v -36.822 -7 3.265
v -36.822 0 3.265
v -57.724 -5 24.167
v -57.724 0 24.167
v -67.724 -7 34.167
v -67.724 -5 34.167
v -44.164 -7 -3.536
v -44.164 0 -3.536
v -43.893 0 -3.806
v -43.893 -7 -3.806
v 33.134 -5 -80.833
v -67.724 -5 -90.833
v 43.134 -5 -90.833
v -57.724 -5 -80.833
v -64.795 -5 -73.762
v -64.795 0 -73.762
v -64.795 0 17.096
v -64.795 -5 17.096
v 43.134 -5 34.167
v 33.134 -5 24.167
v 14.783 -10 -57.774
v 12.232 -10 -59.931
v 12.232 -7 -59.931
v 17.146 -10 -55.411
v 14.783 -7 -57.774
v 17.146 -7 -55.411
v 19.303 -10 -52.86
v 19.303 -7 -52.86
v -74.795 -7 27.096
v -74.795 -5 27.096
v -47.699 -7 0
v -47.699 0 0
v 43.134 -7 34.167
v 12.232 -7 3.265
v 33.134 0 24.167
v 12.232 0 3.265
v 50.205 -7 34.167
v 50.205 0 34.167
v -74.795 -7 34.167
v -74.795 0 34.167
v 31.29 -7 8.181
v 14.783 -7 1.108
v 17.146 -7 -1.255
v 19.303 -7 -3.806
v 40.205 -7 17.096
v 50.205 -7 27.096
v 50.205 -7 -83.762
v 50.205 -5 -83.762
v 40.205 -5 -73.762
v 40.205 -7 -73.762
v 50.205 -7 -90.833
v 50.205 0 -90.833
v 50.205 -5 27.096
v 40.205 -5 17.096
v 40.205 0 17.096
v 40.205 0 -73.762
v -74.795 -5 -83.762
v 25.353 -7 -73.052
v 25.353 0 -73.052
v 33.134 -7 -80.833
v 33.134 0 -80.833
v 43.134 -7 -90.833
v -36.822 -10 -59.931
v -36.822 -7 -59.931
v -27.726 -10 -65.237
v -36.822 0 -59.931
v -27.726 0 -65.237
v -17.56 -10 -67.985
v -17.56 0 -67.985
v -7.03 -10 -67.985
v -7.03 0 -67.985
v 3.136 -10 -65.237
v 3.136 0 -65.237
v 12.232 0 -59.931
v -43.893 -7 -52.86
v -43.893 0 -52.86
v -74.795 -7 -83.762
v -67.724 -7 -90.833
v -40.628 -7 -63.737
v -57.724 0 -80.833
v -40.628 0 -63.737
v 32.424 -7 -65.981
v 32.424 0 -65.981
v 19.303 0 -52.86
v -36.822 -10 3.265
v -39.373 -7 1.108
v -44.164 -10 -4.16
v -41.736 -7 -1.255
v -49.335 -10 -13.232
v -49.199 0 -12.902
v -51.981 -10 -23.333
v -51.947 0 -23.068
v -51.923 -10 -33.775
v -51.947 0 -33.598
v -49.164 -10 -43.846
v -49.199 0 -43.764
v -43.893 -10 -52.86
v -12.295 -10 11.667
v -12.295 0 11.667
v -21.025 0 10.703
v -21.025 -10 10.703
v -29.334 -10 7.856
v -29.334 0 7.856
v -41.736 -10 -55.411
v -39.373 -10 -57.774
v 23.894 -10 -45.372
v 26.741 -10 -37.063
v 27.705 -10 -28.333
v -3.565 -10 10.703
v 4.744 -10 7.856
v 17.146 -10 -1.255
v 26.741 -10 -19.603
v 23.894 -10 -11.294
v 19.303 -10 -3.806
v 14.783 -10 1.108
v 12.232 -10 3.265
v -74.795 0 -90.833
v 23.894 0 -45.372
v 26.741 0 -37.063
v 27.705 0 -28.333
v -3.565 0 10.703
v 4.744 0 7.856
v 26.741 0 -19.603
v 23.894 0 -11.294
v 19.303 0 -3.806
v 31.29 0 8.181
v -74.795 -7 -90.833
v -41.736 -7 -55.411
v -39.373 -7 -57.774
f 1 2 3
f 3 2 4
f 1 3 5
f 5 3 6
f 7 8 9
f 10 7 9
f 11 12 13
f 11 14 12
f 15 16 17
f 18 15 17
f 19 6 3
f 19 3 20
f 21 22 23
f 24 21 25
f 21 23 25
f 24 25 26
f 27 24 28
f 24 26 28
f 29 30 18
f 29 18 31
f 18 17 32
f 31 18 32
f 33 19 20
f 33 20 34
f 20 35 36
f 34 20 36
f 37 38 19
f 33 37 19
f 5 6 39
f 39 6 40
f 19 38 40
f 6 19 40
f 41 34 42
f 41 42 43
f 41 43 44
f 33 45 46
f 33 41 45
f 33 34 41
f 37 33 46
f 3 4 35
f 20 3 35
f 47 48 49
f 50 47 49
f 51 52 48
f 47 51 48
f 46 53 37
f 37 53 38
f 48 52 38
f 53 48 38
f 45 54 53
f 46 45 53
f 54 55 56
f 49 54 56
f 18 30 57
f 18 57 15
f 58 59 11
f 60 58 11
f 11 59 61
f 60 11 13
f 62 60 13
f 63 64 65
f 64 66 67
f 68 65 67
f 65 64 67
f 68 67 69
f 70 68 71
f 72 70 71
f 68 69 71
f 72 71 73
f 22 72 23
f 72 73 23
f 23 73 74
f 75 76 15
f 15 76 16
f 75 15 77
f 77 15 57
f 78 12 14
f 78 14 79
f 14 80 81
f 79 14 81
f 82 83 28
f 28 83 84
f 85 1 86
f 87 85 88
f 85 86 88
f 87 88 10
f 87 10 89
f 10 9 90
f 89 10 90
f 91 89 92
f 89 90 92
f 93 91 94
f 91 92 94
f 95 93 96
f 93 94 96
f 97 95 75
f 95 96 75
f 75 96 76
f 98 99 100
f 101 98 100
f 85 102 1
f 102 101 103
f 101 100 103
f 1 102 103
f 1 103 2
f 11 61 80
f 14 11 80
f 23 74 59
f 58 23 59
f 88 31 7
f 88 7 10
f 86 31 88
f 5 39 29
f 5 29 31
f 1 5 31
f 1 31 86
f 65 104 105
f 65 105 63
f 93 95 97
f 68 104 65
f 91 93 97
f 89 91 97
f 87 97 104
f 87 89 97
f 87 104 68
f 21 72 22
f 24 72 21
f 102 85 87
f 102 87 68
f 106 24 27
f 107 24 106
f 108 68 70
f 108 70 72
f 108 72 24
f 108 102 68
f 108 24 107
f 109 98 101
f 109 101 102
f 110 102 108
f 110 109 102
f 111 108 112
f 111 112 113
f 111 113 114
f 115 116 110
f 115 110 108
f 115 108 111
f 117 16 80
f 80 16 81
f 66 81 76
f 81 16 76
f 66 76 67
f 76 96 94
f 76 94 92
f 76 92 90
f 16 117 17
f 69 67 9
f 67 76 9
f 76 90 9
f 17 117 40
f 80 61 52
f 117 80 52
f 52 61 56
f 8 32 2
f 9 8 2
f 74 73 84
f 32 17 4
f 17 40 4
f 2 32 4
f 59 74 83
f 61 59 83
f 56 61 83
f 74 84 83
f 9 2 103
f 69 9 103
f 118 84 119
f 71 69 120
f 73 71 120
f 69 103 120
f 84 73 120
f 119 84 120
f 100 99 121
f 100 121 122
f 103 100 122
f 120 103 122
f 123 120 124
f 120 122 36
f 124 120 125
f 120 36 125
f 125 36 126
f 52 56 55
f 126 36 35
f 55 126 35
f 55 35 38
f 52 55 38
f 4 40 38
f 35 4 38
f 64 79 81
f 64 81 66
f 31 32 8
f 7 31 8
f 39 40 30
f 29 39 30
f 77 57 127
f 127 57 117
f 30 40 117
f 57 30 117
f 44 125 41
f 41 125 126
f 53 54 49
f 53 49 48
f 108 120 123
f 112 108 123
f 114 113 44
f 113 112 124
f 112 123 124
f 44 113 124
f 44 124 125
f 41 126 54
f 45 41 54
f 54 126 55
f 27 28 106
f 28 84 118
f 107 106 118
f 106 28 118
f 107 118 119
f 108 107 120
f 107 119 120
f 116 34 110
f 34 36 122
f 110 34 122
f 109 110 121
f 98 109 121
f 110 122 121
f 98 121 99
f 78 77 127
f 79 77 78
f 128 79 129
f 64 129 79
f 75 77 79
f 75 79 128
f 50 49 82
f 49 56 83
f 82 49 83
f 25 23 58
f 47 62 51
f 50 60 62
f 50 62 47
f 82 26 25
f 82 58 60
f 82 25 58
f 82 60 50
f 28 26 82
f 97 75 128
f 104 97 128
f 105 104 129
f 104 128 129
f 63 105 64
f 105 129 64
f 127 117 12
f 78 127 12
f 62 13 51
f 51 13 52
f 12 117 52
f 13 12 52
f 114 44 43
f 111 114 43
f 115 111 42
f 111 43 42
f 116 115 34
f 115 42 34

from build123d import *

# Parameters (mm, degrees)
F1_DEPTH = 10
F2_DEPTH = 7
F0_W     = 12.2951196297
F0_H     = 10
F3_DEPTH = 5


with BuildPart() as f1:
    # F0 (on Front) → F1 (new body)
    with BuildSketch(Plane.XZ):
        with BuildLine():
            ThreePointArc((27.7048803703, -28.3328760415), (25.5461182747, -15.3698241684), (19.3028446771, -3.8059795467))
            ThreePointArc((19.3028446771, -3.8059795467), (15.9891516178, -0.0486047941), (12.2317768652, 3.2650882652))
            ThreePointArc((12.2317768652, 3.2650882652), (0.6679322435, 9.5083618628), (-12.2951196297, 11.6671239585))
            ThreePointArc((-12.2951196297, 11.6671239585), (-25.2581715028, 9.5083618628), (-36.8220161245, 3.2650882652))
            ThreePointArc((-36.8220161245, 3.2650882652), (-40.5793860243, -0.0485999413), (-43.8930755201, -3.805968704))
            ThreePointArc((-43.8930755201, -3.805968704), (-52.2951196297, -28.3328691786), (-43.8930839364, -52.8597725364))
            ThreePointArc((-43.8930839364, -52.8597725364), (-40.5793908771, -56.617147289), (-36.8220161245, -59.9308403483))
            ThreePointArc((-36.8220161245, -59.9308403483), (-12.2951196297, -68.3328760415), (12.2317768652, -59.9308403483))
            ThreePointArc((12.2317768652, -59.9308403483), (15.9891516178, -56.617147289), (19.3028446771, -52.8597725364))
            ThreePointArc((19.3028446771, -52.8597725364), (25.5461182747, -41.2959279147), (27.7048803703, -28.3328760415))
        make_face()
    extrude(amount=F1_DEPTH)

    # F0 (on Front) → F2 (join)
    with BuildSketch(Plane.XZ):
        with BuildLine():
            ThreePointArc((-43.8930755201, -3.805968704), (-40.5793860243, -0.0485999413), (-36.8220161245, 3.2650882652))
            Line((-36.8220161245, 3.2650882652), (-40.6279956712, 7.0710678119))
            Line((-40.6279956712, 7.0710678119), (-44.1635295771, 3.5355339059))
            Line((-44.1635295771, 3.5355339059), (-47.6990634831, 0))
            Line((-47.6990634831, 0), (-44.1635295771, -3.5355339059))
            Line((-44.1635295771, -3.5355339059), (-43.8930755201, -3.805968704))
        make_face()
        Polygon((-57.7240518178, 24.1671239585), (-67.7240518178, 34.1671239585), (-74.7951196297, 34.1671239585), (-74.7951196297, 27.0960561466), (-64.7951196297, 17.0960561466), (-47.6990634831, 0), (-44.1635295771, 3.5355339059), (-40.6279956712, 7.0710678119), align=None)
        Polygon((-74.7951196297, -90.8328760415), (-67.7240518178, -90.8328760415), (-57.7240518178, -80.8328760415), (-40.6279956712, -63.7368198949), (-44.1635295771, -60.201285989), (-47.6990634831, -56.6657520831), (-64.7951196297, -73.7618082297), (-74.7951196297, -83.7618082297), align=None)
        with BuildLine():
            Line((-40.6279956712, -63.7368198949), (-36.8220161245, -59.9308403483))
            ThreePointArc((-36.8220161245, -59.9308403483), (-40.5793908771, -56.617147289), (-43.8930839364, -52.8597725364))
            Line((-43.8930839364, -52.8597725364), (-47.6990634831, -56.6657520831))
            Line((-47.6990634831, -56.6657520831), (-44.1635295771, -60.201285989))
            Line((-44.1635295771, -60.201285989), (-40.6279956712, -63.7368198949))
        make_face()
        Polygon((40.2048803703, 17.0960561466), (50.2048803703, 27.0960561466), (50.2048803703, 34.1671239585), (43.1338125585, 34.1671239585), (33.1338125585, 24.1671239585), (24.2192459165, 15.2525573165), (27.7547798224, 11.7170234106), (31.2903137284, 8.1814895046), align=None)
        with BuildLine():
            Line((19.3028446771, -3.8059795467), (31.2903137284, 8.1814895046))
            Line((31.2903137284, 8.1814895046), (27.7547798224, 11.7170234106))
            Line((27.7547798224, 11.7170234106), (24.2192459165, 15.2525573165))
            Line((24.2192459165, 15.2525573165), (12.2317768652, 3.2650882652))
            ThreePointArc((12.2317768652, 3.2650882652), (15.9891516178, -0.0486047941), (19.3028446771, -3.8059795467))
        make_face()
        Polygon((50.2048803703, -90.8328760415), (50.2048803703, -83.7618082297), (40.2048803703, -73.7618082297), (32.423708156, -65.9806360153), (28.88817425, -69.5161699212), (25.3526403441, -73.0517038272), (33.1338125585, -80.8328760415), (43.1338125585, -90.8328760415), align=None)
        with BuildLine():
            Line((28.88817425, -69.5161699212), (32.423708156, -65.9806360153))
            Line((32.423708156, -65.9806360153), (19.3028446771, -52.8597725364))
            ThreePointArc((19.3028446771, -52.8597725364), (15.9891516178, -56.617147289), (12.2317768652, -59.9308403483))
            Line((12.2317768652, -59.9308403483), (25.3526403441, -73.0517038272))
            Line((25.3526403441, -73.0517038272), (28.88817425, -69.5161699212))
        make_face()
    extrude(amount=F2_DEPTH)

    # F0 (on Front) → F3 (join)
    with BuildSketch(Plane.XZ):
        Polygon((50.2048803703, -83.7618082297), (50.2048803703, 0), (40.2048803703, 0), (40.2048803703, -73.7618082297), align=None)
        Polygon((50.2048803703, 0), (50.2048803703, 9.1671239585), (50.2048803703, 27.0960561466), (40.2048803703, 17.0960561466), (40.2048803703, 0), align=None)
        Polygon((33.1338125585, 24.1671239585), (43.1338125585, 34.1671239585), (0, 34.1671239585), (0, 24.1671239585), align=None)
        with Locations((-6.1475598148, 29.1671239585)):
            Rectangle(F0_W, F0_H)
        Polygon((-12.2951196297, 24.1671239585), (-12.2951196297, 34.1671239585), (-67.7240518178, 34.1671239585), (-57.7240518178, 24.1671239585), align=None)
        Polygon((-64.7951196297, 17.0960561466), (-74.7951196297, 27.0960561466), (-74.7951196297, -28.3328760415), (-64.7951196297, -28.3328760415), align=None)
        Polygon((-74.7951196297, -28.3328760415), (-74.7951196297, -83.7618082297), (-64.7951196297, -73.7618082297), (-64.7951196297, -28.3328760415), align=None)
        Polygon((-67.7240518178, -90.8328760415), (0, -90.8328760415), (0, -80.8328760415), (-57.7240518178, -80.8328760415), align=None)
        Polygon((0, -90.8328760415), (43.1338125585, -90.8328760415), (33.1338125585, -80.8328760415), (0, -80.8328760415), align=None)
    extrude(amount=F3_DEPTH)


solid = f1.part
